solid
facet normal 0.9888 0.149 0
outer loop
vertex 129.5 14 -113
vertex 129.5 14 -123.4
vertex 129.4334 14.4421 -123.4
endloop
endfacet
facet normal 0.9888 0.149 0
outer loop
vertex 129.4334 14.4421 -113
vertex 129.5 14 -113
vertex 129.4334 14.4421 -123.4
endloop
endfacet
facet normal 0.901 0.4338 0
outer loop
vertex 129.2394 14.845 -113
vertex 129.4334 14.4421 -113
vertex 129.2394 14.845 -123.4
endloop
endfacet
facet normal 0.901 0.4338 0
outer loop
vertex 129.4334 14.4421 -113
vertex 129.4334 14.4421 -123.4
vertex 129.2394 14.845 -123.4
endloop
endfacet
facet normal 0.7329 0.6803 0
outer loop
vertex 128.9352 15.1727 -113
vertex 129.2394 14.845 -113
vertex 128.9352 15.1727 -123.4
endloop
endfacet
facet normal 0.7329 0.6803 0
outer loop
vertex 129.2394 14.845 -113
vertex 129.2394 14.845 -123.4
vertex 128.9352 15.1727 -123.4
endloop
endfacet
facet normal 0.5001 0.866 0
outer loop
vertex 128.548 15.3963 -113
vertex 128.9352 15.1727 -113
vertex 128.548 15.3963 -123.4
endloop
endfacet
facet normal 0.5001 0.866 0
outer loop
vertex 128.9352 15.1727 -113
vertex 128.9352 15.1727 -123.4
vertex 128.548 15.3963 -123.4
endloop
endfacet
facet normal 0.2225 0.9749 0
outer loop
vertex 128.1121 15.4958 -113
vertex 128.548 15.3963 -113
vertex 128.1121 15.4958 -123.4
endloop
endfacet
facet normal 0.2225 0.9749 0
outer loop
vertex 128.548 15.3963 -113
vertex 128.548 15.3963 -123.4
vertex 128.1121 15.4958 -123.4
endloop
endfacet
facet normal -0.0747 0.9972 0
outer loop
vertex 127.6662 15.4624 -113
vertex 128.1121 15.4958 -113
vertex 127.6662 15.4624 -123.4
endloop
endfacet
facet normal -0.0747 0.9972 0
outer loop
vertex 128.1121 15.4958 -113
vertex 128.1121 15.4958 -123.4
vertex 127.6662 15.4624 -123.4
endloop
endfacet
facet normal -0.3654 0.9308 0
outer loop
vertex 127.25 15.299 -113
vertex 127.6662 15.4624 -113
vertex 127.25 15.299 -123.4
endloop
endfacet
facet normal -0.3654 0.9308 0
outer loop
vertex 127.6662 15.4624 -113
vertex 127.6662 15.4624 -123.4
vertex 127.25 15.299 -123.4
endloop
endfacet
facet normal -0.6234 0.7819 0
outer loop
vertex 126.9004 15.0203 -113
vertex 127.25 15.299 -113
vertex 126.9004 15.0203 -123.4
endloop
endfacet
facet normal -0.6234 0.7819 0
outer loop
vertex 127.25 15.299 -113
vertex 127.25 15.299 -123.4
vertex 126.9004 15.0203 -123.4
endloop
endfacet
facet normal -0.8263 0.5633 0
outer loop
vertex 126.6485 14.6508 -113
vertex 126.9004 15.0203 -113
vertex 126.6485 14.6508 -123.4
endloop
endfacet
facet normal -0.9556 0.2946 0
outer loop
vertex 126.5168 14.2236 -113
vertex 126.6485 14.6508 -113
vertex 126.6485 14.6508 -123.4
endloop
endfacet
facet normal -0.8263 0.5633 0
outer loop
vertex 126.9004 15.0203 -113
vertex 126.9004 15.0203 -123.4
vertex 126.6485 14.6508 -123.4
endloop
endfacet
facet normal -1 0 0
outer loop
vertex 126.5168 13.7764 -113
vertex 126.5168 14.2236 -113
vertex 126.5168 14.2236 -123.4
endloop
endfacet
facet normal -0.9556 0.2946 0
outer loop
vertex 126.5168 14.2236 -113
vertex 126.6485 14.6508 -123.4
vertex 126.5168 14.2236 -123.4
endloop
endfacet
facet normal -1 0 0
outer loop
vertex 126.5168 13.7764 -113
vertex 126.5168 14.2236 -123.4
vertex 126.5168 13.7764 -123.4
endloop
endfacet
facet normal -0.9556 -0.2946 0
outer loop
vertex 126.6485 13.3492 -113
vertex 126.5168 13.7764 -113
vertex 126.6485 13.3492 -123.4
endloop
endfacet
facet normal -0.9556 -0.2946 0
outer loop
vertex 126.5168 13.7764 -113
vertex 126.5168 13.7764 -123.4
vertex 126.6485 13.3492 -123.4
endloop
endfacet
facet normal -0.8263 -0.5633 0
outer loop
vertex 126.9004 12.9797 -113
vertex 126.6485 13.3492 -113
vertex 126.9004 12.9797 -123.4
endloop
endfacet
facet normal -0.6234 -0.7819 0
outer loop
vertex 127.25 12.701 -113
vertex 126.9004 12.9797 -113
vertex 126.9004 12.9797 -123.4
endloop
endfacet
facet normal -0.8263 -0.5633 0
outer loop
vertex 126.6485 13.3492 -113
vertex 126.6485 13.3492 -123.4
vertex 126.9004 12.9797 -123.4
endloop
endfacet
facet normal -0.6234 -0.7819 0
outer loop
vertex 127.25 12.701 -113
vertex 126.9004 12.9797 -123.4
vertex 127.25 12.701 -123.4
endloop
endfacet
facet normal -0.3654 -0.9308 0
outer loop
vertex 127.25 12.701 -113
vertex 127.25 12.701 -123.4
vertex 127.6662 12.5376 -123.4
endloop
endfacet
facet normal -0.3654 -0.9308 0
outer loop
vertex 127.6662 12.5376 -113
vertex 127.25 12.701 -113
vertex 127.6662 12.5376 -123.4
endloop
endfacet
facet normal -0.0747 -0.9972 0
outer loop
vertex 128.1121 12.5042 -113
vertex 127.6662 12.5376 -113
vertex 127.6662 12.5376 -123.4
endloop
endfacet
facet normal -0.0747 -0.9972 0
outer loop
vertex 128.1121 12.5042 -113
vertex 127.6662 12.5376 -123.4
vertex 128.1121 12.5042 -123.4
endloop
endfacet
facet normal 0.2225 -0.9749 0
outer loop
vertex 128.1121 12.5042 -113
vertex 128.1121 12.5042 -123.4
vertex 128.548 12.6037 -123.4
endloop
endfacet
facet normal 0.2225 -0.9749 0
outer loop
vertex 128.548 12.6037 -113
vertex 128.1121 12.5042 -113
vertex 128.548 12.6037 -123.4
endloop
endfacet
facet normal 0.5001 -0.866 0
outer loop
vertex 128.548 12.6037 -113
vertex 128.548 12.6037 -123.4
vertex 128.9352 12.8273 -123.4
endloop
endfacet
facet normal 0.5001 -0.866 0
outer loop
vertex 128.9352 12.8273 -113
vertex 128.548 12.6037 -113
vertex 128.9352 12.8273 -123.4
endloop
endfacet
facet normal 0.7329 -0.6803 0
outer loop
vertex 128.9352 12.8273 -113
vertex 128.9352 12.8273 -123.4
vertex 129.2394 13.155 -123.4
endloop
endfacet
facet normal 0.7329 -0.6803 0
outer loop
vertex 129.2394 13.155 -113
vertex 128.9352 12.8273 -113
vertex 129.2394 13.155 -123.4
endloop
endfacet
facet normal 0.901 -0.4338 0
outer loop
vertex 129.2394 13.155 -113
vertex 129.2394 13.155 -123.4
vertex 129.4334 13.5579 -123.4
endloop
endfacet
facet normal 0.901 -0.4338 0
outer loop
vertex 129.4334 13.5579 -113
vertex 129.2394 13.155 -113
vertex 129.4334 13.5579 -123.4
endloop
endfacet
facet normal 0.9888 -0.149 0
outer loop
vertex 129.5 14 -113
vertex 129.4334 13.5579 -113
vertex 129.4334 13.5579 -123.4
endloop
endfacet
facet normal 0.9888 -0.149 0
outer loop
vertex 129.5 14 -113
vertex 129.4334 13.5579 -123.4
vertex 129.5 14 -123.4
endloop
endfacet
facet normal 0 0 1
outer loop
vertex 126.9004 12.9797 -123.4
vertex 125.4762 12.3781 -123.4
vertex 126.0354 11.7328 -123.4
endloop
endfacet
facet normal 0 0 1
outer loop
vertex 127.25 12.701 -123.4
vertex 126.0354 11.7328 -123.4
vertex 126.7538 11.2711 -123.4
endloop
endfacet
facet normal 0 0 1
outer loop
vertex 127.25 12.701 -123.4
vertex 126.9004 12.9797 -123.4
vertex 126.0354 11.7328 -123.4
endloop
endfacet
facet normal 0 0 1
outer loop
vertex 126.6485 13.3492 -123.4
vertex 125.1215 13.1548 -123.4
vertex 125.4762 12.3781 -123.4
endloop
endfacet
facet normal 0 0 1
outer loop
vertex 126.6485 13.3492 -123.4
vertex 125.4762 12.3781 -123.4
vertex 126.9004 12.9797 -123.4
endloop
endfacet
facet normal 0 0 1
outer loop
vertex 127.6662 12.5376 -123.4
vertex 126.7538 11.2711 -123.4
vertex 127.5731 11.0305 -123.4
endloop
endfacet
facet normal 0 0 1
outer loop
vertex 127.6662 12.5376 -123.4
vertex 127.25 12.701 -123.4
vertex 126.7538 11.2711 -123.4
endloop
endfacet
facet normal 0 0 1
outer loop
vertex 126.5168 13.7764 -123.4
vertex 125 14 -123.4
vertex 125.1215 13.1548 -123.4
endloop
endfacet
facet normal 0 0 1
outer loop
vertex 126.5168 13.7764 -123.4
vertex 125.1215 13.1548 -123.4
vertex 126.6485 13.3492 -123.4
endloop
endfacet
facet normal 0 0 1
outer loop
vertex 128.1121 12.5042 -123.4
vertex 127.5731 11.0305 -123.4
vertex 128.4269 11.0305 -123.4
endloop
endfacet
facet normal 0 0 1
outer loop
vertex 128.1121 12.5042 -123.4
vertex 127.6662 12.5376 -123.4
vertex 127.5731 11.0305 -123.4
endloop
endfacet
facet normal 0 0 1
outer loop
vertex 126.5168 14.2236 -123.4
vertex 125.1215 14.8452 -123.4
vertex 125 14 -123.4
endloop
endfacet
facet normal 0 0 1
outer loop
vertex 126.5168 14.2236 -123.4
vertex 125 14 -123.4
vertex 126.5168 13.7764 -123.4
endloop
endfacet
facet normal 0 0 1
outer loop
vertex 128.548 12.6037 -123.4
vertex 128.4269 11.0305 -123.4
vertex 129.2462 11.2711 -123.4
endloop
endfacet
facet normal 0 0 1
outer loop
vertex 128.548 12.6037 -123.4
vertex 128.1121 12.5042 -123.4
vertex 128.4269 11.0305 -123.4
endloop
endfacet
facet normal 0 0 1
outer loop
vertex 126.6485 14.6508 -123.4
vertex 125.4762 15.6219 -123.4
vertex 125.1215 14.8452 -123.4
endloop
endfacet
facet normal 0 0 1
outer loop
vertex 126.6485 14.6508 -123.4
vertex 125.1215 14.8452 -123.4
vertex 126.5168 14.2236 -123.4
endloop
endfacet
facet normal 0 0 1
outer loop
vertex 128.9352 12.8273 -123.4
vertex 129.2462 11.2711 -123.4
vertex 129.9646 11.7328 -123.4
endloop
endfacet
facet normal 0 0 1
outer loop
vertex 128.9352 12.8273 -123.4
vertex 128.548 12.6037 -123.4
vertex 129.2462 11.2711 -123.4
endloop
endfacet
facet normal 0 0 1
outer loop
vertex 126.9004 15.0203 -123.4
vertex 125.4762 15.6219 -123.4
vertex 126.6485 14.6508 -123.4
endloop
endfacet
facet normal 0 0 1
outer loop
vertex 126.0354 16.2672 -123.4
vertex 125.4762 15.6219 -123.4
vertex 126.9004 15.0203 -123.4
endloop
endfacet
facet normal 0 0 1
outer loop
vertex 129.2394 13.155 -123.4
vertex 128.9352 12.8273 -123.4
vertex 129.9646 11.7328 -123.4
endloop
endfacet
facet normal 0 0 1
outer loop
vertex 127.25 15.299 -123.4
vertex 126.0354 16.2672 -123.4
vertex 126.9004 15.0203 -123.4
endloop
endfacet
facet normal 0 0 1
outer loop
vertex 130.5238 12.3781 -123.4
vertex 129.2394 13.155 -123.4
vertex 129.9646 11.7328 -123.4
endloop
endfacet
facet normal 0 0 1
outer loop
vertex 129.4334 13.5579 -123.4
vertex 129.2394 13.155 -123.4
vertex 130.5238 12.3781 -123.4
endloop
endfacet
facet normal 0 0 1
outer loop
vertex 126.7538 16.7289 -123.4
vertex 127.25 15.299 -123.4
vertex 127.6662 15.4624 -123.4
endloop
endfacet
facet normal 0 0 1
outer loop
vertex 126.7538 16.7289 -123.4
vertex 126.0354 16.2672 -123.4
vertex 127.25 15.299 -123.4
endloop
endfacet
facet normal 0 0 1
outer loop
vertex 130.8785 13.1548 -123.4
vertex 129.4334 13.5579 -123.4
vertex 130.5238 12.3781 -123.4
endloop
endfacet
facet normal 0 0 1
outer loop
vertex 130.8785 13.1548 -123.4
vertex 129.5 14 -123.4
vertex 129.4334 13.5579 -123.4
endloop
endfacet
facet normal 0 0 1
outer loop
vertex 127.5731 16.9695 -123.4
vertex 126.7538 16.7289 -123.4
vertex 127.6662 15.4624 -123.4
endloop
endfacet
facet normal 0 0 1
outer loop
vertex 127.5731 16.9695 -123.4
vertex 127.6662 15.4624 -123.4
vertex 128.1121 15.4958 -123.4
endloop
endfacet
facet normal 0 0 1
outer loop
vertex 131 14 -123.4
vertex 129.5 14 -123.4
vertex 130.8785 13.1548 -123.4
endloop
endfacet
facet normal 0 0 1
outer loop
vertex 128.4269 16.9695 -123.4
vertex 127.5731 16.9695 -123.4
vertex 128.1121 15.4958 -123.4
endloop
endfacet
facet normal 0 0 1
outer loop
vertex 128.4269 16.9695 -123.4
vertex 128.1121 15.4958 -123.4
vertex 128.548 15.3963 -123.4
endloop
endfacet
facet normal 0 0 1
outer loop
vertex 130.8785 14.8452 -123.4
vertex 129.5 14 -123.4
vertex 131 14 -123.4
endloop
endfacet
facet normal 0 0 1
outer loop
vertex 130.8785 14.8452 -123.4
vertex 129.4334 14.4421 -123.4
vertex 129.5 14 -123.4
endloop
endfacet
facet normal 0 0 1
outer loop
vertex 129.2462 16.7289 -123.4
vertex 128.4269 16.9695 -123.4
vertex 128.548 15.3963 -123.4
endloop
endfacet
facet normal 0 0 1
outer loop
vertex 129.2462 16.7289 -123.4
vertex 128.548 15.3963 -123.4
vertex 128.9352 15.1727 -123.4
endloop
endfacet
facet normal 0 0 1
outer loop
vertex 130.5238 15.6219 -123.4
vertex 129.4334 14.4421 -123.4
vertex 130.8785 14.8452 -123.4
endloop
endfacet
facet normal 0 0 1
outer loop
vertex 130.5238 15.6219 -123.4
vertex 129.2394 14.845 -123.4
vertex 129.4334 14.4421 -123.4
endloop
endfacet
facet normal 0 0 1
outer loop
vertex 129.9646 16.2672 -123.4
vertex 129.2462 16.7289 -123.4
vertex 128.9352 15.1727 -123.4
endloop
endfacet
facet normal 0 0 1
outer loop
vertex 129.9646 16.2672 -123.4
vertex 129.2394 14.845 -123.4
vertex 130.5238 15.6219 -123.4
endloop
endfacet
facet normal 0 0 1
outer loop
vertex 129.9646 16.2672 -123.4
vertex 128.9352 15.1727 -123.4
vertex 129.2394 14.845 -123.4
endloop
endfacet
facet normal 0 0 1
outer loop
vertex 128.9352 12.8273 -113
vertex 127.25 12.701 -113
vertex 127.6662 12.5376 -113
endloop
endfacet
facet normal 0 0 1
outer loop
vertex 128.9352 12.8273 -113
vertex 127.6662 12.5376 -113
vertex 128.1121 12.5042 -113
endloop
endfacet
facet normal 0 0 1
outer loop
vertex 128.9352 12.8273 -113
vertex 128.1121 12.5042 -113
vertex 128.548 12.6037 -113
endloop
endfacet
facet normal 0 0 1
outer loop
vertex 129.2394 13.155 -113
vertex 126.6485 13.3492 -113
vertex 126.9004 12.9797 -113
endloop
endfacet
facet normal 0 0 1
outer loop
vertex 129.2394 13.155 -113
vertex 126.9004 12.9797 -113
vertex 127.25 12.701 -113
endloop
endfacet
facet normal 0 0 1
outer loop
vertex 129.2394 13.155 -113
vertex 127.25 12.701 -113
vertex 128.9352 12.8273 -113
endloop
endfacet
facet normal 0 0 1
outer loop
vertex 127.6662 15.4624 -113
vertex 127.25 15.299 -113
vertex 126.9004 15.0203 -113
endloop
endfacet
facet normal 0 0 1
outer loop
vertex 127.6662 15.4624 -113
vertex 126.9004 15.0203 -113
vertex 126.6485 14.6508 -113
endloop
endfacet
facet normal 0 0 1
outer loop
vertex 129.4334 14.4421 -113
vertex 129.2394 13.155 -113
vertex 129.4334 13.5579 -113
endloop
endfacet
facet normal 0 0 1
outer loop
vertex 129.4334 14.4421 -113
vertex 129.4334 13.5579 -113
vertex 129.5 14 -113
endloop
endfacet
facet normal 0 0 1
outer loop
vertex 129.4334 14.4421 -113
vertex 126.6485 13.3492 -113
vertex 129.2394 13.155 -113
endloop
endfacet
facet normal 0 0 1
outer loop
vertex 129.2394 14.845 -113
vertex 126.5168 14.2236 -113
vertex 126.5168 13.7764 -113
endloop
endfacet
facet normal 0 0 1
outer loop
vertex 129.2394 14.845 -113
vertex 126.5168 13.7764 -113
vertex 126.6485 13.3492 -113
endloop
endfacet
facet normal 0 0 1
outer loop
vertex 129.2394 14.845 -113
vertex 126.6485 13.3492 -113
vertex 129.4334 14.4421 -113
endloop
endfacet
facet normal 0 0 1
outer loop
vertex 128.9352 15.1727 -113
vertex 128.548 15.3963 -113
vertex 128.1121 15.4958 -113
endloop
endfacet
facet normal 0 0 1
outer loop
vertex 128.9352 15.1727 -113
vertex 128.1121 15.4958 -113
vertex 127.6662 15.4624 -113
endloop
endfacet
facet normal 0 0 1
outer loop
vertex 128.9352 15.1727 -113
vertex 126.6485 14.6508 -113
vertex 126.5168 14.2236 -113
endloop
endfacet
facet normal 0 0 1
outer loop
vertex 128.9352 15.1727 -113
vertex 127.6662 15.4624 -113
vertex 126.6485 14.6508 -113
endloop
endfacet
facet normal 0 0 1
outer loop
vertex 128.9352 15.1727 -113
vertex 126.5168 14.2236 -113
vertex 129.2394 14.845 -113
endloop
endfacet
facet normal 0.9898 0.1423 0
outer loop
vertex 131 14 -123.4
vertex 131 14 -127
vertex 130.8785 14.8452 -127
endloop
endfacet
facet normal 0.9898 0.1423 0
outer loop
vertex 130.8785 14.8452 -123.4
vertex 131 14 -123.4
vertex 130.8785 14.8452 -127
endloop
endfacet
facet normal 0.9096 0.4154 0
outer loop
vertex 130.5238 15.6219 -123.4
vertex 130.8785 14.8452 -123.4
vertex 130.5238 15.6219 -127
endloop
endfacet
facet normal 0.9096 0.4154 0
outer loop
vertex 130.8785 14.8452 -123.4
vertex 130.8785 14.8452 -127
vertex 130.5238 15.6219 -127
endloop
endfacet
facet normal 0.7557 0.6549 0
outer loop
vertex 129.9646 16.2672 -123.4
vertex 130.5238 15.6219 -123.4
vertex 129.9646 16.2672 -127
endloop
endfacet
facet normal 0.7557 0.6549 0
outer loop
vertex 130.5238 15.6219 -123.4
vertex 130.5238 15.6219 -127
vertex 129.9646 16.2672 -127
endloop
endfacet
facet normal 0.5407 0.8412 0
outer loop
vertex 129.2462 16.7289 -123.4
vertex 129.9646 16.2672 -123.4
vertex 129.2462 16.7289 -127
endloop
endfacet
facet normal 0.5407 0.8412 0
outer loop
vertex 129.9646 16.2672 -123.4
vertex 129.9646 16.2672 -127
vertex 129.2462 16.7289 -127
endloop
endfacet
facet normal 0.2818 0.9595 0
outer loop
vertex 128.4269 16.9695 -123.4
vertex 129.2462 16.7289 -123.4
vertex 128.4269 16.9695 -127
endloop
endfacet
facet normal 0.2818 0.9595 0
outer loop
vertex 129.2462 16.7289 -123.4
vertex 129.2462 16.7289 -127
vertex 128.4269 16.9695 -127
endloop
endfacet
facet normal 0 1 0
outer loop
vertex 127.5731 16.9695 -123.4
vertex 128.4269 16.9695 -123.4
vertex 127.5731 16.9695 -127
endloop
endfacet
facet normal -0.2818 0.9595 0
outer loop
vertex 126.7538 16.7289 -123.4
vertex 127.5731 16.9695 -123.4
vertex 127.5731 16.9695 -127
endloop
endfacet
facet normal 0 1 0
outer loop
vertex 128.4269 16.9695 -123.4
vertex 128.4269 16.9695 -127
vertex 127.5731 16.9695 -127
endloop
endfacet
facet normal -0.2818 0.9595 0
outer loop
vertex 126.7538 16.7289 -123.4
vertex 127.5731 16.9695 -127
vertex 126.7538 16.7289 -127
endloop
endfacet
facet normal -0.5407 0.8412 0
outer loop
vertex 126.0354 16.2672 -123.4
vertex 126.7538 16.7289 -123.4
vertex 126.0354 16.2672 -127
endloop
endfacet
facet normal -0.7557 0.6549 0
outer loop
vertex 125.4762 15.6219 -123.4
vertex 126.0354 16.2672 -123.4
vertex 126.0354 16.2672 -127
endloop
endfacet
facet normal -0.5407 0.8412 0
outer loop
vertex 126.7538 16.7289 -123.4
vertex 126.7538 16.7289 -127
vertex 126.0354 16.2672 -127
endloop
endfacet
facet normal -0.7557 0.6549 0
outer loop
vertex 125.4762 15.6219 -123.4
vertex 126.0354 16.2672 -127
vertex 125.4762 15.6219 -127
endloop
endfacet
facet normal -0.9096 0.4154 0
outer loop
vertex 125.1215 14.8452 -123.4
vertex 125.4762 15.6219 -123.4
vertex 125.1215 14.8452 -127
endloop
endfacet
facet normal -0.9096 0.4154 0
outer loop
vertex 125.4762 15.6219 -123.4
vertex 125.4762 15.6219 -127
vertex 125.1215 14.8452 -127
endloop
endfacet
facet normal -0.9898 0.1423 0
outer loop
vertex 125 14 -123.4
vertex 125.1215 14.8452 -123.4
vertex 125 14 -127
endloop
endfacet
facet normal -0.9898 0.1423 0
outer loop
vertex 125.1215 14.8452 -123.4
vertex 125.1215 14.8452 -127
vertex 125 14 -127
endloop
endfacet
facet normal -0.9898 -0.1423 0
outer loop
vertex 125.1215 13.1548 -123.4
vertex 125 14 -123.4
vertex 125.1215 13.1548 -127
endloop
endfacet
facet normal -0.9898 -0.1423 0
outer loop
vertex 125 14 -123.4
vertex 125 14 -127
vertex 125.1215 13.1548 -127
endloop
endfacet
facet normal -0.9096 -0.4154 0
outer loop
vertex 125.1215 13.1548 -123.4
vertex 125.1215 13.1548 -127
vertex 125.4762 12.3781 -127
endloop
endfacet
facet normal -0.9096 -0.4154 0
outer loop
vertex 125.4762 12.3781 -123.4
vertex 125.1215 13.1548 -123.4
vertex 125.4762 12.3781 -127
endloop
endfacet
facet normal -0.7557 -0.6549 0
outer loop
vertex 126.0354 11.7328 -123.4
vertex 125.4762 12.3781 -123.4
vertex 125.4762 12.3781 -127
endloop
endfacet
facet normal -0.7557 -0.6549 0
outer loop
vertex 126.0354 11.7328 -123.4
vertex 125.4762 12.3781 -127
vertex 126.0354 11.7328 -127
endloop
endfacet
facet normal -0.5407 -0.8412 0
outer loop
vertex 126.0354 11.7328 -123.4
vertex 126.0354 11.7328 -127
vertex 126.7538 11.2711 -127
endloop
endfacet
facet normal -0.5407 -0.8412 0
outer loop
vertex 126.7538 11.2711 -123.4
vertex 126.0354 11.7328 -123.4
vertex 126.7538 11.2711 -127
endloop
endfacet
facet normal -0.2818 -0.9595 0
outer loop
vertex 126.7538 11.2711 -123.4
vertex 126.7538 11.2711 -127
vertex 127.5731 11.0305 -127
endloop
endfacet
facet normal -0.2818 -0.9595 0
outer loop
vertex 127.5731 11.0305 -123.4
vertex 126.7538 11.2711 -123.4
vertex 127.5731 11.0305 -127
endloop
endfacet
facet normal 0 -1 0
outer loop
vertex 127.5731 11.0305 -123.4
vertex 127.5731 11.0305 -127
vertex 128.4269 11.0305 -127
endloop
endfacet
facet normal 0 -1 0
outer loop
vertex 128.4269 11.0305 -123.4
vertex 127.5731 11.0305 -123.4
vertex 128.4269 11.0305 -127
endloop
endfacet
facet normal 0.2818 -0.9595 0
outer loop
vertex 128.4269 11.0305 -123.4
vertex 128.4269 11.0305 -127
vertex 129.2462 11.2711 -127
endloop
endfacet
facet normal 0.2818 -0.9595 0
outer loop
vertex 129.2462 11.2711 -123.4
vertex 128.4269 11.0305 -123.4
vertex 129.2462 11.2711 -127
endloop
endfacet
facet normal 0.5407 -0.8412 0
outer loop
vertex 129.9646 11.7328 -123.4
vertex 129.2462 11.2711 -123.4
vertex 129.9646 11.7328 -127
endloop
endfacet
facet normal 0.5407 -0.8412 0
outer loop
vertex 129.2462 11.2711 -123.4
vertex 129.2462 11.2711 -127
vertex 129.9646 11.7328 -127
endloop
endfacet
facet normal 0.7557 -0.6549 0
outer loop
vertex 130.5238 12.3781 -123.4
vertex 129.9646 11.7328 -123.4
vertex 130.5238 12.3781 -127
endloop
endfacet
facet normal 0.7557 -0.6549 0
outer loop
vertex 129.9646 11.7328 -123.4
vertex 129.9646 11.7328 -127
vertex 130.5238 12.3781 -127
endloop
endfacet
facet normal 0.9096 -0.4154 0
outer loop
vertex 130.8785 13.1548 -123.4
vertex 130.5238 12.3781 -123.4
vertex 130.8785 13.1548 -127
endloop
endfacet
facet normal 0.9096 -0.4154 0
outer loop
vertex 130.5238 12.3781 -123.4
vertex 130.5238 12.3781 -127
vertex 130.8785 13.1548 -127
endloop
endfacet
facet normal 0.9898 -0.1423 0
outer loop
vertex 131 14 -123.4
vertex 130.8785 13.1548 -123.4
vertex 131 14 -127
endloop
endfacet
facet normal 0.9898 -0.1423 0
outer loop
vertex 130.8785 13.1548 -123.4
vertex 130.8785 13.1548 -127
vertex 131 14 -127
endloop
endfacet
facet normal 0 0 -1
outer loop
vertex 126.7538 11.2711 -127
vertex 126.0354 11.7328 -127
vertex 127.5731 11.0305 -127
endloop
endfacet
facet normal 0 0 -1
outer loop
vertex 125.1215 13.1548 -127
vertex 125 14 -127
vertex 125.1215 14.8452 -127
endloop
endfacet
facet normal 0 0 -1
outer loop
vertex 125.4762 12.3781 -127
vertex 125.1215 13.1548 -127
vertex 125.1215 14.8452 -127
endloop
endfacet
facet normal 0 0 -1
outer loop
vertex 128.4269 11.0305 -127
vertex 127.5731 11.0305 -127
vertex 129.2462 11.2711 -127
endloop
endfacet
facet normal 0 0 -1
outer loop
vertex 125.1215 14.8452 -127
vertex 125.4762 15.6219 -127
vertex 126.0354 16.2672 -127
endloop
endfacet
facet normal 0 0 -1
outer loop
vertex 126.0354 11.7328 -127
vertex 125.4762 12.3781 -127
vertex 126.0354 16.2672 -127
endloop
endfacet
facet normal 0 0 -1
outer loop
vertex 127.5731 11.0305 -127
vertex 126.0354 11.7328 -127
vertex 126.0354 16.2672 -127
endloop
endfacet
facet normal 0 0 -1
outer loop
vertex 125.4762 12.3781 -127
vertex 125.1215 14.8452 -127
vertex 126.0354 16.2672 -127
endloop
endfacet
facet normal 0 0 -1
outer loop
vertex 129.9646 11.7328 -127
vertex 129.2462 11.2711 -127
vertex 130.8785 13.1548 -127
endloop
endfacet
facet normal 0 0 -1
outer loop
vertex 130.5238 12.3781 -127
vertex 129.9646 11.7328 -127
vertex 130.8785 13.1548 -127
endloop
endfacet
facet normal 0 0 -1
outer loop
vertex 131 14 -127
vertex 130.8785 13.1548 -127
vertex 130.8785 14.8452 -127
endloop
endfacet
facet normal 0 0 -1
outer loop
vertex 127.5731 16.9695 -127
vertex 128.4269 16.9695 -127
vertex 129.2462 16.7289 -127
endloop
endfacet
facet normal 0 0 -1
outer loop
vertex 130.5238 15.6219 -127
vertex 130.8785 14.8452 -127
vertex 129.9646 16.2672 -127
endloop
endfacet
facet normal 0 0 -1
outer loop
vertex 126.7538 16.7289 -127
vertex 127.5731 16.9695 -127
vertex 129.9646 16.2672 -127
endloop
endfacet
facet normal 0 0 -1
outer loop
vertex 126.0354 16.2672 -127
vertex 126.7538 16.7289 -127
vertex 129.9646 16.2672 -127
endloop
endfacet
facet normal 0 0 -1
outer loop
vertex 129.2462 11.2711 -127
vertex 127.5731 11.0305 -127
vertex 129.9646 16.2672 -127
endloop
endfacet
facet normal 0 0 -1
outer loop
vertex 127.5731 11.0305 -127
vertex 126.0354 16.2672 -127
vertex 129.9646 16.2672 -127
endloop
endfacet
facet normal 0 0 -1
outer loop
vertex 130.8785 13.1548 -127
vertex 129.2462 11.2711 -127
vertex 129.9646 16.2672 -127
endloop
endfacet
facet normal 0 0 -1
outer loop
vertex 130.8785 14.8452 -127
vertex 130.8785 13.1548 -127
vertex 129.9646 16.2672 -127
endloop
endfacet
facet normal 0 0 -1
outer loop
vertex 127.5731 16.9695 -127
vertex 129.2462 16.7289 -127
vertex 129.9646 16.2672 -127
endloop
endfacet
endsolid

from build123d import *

# Parameters (mm, degrees)
CYLINDER034_R     = 3
CYLINDER034_DEPTH = 3.6
CYLINDER035_R     = 1.5
CYLINDER035_DEPTH = 14


with BuildPart() as cylinder034:
    # Cylinder034 → Cylinder034 (new body)
    with BuildSketch(Plane.XY.offset(10)):
        Circle(CYLINDER034_R)
    extrude(amount=CYLINDER034_DEPTH)


with BuildPart() as cortador_tornillo_cabeza_hundida:
    # Cylinder035 → Cylinder035 (new body)
    with BuildSketch(Plane.XY.offset(10)):
        Circle(CYLINDER035_R)
    extrude(amount=CYLINDER035_DEPTH)

    # Fusion007002009027003005008003003018004: union Cylinder034
    add(cylinder034.part)


with BuildPart() as cortador_tornillo_cabeza_hundida_1:
    # Fusion007002009027003005008003003018004 placement: moved
    add(cortador_tornillo_cabeza_hundida.part.moved(Location((128, 14, -137))))


solid = cortador_tornillo_cabeza_hundida_1.part
